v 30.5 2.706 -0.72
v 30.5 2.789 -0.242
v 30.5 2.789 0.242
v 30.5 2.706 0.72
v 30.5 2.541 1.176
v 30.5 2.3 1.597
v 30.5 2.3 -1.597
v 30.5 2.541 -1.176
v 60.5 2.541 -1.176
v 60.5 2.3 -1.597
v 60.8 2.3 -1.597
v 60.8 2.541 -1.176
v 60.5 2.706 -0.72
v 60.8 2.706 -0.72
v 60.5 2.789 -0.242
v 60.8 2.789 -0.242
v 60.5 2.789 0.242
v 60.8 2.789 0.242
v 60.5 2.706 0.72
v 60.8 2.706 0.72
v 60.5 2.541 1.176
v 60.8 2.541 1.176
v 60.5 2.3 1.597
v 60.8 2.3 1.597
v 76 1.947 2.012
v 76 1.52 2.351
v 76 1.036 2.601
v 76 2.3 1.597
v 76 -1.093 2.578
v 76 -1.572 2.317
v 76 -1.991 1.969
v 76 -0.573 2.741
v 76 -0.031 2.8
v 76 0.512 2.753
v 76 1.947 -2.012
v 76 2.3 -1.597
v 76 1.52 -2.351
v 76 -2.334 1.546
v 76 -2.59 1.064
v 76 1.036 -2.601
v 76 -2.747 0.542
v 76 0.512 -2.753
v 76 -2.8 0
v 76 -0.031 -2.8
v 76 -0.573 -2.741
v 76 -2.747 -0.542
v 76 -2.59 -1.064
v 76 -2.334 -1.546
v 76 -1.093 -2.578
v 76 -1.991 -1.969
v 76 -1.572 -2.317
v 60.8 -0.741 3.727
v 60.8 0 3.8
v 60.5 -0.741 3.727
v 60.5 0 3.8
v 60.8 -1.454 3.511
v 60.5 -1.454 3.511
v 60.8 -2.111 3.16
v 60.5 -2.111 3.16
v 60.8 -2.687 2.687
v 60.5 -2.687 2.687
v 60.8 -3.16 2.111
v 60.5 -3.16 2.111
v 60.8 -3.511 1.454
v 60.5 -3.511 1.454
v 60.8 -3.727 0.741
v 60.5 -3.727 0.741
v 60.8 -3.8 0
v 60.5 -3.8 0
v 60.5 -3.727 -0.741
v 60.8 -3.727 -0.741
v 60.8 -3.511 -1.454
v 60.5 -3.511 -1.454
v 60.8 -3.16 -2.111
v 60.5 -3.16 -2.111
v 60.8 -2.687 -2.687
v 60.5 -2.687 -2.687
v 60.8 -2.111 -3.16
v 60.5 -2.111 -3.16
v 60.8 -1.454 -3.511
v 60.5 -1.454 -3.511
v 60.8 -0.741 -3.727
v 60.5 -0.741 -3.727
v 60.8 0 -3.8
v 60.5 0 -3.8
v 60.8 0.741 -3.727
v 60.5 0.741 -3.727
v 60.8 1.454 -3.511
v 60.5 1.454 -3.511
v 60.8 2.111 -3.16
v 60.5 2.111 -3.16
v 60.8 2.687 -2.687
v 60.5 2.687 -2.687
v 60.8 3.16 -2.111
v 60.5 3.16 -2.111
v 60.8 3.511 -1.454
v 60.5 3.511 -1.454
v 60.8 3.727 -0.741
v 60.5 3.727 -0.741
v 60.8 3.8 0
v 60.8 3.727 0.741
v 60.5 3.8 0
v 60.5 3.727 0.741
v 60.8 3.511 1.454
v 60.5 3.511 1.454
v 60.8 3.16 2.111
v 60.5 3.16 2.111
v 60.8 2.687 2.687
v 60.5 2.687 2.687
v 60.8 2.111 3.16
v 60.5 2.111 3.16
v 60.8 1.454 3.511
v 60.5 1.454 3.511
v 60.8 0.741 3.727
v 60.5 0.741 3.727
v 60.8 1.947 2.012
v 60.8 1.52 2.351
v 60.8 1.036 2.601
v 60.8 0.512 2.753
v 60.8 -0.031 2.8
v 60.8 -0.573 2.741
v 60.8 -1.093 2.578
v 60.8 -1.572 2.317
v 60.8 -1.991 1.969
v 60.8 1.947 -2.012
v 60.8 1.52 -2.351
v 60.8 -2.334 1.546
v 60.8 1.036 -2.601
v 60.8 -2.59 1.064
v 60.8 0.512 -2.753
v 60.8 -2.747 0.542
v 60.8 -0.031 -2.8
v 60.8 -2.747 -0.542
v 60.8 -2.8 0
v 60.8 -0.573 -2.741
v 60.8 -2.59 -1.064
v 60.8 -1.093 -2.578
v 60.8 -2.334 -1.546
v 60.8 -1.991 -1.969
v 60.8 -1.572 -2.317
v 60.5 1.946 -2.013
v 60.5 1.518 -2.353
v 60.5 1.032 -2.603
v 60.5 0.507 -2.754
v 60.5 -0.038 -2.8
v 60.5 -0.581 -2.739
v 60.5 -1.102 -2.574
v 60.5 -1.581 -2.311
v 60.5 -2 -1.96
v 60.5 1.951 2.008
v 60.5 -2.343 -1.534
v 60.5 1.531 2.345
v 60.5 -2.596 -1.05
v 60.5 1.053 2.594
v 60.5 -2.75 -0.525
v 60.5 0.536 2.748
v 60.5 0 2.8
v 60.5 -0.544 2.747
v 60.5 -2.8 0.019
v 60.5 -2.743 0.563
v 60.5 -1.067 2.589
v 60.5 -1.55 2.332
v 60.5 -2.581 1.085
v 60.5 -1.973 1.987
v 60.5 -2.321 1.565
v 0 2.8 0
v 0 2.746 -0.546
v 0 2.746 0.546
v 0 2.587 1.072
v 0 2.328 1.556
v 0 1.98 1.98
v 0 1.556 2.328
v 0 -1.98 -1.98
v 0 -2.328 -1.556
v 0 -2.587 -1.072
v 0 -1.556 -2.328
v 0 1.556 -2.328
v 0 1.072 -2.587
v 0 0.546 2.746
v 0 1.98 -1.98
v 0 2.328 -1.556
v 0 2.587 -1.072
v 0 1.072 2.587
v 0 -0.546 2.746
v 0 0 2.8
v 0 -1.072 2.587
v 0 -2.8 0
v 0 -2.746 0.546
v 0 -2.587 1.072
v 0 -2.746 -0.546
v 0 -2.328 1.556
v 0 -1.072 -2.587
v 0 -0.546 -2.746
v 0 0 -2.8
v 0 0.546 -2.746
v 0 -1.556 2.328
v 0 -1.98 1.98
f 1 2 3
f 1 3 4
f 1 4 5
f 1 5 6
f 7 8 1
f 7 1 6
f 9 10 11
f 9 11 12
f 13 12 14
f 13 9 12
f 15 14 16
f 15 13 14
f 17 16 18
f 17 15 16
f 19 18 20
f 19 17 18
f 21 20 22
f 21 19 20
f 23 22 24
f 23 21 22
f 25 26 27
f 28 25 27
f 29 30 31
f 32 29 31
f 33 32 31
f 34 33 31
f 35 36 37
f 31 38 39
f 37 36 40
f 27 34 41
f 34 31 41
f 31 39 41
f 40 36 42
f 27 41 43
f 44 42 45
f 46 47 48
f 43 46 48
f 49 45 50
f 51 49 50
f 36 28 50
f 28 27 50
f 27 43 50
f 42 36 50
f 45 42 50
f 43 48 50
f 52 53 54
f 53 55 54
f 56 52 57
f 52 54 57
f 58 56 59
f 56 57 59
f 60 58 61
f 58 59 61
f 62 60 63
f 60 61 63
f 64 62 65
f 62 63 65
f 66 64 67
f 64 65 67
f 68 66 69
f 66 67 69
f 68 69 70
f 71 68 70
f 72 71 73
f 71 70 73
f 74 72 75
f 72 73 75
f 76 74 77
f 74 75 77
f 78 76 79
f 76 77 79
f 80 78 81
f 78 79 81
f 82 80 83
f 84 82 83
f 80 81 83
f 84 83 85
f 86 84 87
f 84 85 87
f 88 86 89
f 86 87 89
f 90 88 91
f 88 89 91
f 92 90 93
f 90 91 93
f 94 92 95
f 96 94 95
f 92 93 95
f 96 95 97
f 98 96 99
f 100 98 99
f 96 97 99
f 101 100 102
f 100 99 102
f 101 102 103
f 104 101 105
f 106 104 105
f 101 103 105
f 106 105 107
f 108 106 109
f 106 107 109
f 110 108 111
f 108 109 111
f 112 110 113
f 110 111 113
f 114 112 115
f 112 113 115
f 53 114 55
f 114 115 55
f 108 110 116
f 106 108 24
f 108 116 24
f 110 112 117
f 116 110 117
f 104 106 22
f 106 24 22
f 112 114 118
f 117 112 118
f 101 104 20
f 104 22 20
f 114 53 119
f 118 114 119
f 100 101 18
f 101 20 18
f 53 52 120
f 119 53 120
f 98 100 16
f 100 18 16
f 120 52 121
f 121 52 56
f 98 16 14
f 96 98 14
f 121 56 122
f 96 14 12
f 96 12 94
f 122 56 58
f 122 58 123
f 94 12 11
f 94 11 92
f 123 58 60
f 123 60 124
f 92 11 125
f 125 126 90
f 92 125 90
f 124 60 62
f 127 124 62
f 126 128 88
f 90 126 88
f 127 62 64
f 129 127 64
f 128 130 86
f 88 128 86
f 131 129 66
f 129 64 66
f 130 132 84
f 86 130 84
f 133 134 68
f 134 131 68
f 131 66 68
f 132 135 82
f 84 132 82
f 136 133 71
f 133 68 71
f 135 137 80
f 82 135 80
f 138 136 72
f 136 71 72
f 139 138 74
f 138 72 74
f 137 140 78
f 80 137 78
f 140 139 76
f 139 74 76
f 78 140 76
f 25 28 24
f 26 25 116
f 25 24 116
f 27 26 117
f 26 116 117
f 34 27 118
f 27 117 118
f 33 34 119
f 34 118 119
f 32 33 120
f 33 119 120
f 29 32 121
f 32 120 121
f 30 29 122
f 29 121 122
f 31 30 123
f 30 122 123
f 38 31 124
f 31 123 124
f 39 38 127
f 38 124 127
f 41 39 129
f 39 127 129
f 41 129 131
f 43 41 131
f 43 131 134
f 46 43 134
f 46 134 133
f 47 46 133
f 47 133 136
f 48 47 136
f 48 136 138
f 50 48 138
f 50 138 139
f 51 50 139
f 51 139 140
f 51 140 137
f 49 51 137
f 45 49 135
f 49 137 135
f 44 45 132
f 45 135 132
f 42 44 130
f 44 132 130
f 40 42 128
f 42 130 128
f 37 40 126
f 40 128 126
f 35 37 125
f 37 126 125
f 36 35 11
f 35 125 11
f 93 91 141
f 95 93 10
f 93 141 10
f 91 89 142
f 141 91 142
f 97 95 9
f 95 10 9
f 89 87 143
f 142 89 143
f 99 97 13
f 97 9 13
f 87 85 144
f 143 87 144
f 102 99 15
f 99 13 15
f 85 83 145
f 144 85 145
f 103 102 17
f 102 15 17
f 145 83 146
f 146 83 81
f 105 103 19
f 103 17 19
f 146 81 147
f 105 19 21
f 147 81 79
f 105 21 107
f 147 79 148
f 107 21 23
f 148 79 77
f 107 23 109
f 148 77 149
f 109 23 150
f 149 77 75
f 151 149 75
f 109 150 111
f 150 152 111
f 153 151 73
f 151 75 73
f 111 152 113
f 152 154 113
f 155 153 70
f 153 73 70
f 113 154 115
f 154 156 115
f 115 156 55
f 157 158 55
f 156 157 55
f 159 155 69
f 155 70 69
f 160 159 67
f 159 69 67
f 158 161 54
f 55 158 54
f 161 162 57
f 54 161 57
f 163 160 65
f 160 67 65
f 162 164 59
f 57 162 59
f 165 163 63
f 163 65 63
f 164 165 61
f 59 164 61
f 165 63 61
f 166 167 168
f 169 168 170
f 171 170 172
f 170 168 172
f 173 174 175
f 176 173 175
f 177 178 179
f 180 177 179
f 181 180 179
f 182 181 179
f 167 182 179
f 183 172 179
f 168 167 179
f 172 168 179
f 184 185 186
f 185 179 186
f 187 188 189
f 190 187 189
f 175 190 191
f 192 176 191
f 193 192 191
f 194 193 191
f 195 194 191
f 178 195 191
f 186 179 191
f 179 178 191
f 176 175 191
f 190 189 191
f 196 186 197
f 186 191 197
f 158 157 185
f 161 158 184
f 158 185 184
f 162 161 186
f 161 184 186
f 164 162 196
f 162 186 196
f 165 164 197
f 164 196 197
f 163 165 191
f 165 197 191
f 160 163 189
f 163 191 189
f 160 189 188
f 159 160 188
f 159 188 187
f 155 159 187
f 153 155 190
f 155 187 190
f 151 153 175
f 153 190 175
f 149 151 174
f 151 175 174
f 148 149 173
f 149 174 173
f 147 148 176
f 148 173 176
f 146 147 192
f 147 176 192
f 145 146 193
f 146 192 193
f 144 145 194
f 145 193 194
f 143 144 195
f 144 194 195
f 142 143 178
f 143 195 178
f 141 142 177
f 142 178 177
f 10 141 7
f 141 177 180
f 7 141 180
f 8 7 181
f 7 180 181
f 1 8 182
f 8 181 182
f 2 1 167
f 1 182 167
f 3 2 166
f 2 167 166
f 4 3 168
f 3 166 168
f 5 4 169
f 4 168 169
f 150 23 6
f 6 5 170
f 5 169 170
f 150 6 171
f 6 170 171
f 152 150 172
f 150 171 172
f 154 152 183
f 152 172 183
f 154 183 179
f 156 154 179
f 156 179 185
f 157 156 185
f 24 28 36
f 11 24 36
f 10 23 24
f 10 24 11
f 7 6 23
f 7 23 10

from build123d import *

# Parameters (mm, degrees)
ENL_V_START             = -45.5
ENL_V_MAT_EXTRU_1_DEPTH = 45.5


with BuildPart() as part:
    # Esquisse1 → Révolution1 (revolve)
    with BuildSketch(Plane.XY, mode=Mode.PRIVATE) as r_volution1_sk:
        Polygon((60.8, 2.8), (60.8, 3.8), (60.5, 3.8), (60.5, 2.8), (0, 2.8), (0, 0), (76, 0), (76, 2.8), align=None)
    revolve(r_volution1_sk.sketch.rotate(Axis((0, 0, 0), (1, 0, 0)), 90), axis=Axis((0, 0, 0), (1, 0, 0)))

    # Esquisse2 → Enlèv. mat.-Extru.1 (cut)
    with BuildSketch(Plane(origin=(76, 0, 0), x_dir=(0, 0, -1), z_dir=(1, 0, 0)).offset(ENL_V_START)):
        with BuildLine():
            Line((-1.596871942, 2.3), (1.596871942, 2.3))
            ThreePointArc((1.596871942, 2.3), (0, 2.8), (-1.596871942, 2.3))
        make_face()
    extrude(amount=ENL_V_MAT_EXTRU_1_DEPTH, mode=Mode.SUBTRACT)


solid = part.part
